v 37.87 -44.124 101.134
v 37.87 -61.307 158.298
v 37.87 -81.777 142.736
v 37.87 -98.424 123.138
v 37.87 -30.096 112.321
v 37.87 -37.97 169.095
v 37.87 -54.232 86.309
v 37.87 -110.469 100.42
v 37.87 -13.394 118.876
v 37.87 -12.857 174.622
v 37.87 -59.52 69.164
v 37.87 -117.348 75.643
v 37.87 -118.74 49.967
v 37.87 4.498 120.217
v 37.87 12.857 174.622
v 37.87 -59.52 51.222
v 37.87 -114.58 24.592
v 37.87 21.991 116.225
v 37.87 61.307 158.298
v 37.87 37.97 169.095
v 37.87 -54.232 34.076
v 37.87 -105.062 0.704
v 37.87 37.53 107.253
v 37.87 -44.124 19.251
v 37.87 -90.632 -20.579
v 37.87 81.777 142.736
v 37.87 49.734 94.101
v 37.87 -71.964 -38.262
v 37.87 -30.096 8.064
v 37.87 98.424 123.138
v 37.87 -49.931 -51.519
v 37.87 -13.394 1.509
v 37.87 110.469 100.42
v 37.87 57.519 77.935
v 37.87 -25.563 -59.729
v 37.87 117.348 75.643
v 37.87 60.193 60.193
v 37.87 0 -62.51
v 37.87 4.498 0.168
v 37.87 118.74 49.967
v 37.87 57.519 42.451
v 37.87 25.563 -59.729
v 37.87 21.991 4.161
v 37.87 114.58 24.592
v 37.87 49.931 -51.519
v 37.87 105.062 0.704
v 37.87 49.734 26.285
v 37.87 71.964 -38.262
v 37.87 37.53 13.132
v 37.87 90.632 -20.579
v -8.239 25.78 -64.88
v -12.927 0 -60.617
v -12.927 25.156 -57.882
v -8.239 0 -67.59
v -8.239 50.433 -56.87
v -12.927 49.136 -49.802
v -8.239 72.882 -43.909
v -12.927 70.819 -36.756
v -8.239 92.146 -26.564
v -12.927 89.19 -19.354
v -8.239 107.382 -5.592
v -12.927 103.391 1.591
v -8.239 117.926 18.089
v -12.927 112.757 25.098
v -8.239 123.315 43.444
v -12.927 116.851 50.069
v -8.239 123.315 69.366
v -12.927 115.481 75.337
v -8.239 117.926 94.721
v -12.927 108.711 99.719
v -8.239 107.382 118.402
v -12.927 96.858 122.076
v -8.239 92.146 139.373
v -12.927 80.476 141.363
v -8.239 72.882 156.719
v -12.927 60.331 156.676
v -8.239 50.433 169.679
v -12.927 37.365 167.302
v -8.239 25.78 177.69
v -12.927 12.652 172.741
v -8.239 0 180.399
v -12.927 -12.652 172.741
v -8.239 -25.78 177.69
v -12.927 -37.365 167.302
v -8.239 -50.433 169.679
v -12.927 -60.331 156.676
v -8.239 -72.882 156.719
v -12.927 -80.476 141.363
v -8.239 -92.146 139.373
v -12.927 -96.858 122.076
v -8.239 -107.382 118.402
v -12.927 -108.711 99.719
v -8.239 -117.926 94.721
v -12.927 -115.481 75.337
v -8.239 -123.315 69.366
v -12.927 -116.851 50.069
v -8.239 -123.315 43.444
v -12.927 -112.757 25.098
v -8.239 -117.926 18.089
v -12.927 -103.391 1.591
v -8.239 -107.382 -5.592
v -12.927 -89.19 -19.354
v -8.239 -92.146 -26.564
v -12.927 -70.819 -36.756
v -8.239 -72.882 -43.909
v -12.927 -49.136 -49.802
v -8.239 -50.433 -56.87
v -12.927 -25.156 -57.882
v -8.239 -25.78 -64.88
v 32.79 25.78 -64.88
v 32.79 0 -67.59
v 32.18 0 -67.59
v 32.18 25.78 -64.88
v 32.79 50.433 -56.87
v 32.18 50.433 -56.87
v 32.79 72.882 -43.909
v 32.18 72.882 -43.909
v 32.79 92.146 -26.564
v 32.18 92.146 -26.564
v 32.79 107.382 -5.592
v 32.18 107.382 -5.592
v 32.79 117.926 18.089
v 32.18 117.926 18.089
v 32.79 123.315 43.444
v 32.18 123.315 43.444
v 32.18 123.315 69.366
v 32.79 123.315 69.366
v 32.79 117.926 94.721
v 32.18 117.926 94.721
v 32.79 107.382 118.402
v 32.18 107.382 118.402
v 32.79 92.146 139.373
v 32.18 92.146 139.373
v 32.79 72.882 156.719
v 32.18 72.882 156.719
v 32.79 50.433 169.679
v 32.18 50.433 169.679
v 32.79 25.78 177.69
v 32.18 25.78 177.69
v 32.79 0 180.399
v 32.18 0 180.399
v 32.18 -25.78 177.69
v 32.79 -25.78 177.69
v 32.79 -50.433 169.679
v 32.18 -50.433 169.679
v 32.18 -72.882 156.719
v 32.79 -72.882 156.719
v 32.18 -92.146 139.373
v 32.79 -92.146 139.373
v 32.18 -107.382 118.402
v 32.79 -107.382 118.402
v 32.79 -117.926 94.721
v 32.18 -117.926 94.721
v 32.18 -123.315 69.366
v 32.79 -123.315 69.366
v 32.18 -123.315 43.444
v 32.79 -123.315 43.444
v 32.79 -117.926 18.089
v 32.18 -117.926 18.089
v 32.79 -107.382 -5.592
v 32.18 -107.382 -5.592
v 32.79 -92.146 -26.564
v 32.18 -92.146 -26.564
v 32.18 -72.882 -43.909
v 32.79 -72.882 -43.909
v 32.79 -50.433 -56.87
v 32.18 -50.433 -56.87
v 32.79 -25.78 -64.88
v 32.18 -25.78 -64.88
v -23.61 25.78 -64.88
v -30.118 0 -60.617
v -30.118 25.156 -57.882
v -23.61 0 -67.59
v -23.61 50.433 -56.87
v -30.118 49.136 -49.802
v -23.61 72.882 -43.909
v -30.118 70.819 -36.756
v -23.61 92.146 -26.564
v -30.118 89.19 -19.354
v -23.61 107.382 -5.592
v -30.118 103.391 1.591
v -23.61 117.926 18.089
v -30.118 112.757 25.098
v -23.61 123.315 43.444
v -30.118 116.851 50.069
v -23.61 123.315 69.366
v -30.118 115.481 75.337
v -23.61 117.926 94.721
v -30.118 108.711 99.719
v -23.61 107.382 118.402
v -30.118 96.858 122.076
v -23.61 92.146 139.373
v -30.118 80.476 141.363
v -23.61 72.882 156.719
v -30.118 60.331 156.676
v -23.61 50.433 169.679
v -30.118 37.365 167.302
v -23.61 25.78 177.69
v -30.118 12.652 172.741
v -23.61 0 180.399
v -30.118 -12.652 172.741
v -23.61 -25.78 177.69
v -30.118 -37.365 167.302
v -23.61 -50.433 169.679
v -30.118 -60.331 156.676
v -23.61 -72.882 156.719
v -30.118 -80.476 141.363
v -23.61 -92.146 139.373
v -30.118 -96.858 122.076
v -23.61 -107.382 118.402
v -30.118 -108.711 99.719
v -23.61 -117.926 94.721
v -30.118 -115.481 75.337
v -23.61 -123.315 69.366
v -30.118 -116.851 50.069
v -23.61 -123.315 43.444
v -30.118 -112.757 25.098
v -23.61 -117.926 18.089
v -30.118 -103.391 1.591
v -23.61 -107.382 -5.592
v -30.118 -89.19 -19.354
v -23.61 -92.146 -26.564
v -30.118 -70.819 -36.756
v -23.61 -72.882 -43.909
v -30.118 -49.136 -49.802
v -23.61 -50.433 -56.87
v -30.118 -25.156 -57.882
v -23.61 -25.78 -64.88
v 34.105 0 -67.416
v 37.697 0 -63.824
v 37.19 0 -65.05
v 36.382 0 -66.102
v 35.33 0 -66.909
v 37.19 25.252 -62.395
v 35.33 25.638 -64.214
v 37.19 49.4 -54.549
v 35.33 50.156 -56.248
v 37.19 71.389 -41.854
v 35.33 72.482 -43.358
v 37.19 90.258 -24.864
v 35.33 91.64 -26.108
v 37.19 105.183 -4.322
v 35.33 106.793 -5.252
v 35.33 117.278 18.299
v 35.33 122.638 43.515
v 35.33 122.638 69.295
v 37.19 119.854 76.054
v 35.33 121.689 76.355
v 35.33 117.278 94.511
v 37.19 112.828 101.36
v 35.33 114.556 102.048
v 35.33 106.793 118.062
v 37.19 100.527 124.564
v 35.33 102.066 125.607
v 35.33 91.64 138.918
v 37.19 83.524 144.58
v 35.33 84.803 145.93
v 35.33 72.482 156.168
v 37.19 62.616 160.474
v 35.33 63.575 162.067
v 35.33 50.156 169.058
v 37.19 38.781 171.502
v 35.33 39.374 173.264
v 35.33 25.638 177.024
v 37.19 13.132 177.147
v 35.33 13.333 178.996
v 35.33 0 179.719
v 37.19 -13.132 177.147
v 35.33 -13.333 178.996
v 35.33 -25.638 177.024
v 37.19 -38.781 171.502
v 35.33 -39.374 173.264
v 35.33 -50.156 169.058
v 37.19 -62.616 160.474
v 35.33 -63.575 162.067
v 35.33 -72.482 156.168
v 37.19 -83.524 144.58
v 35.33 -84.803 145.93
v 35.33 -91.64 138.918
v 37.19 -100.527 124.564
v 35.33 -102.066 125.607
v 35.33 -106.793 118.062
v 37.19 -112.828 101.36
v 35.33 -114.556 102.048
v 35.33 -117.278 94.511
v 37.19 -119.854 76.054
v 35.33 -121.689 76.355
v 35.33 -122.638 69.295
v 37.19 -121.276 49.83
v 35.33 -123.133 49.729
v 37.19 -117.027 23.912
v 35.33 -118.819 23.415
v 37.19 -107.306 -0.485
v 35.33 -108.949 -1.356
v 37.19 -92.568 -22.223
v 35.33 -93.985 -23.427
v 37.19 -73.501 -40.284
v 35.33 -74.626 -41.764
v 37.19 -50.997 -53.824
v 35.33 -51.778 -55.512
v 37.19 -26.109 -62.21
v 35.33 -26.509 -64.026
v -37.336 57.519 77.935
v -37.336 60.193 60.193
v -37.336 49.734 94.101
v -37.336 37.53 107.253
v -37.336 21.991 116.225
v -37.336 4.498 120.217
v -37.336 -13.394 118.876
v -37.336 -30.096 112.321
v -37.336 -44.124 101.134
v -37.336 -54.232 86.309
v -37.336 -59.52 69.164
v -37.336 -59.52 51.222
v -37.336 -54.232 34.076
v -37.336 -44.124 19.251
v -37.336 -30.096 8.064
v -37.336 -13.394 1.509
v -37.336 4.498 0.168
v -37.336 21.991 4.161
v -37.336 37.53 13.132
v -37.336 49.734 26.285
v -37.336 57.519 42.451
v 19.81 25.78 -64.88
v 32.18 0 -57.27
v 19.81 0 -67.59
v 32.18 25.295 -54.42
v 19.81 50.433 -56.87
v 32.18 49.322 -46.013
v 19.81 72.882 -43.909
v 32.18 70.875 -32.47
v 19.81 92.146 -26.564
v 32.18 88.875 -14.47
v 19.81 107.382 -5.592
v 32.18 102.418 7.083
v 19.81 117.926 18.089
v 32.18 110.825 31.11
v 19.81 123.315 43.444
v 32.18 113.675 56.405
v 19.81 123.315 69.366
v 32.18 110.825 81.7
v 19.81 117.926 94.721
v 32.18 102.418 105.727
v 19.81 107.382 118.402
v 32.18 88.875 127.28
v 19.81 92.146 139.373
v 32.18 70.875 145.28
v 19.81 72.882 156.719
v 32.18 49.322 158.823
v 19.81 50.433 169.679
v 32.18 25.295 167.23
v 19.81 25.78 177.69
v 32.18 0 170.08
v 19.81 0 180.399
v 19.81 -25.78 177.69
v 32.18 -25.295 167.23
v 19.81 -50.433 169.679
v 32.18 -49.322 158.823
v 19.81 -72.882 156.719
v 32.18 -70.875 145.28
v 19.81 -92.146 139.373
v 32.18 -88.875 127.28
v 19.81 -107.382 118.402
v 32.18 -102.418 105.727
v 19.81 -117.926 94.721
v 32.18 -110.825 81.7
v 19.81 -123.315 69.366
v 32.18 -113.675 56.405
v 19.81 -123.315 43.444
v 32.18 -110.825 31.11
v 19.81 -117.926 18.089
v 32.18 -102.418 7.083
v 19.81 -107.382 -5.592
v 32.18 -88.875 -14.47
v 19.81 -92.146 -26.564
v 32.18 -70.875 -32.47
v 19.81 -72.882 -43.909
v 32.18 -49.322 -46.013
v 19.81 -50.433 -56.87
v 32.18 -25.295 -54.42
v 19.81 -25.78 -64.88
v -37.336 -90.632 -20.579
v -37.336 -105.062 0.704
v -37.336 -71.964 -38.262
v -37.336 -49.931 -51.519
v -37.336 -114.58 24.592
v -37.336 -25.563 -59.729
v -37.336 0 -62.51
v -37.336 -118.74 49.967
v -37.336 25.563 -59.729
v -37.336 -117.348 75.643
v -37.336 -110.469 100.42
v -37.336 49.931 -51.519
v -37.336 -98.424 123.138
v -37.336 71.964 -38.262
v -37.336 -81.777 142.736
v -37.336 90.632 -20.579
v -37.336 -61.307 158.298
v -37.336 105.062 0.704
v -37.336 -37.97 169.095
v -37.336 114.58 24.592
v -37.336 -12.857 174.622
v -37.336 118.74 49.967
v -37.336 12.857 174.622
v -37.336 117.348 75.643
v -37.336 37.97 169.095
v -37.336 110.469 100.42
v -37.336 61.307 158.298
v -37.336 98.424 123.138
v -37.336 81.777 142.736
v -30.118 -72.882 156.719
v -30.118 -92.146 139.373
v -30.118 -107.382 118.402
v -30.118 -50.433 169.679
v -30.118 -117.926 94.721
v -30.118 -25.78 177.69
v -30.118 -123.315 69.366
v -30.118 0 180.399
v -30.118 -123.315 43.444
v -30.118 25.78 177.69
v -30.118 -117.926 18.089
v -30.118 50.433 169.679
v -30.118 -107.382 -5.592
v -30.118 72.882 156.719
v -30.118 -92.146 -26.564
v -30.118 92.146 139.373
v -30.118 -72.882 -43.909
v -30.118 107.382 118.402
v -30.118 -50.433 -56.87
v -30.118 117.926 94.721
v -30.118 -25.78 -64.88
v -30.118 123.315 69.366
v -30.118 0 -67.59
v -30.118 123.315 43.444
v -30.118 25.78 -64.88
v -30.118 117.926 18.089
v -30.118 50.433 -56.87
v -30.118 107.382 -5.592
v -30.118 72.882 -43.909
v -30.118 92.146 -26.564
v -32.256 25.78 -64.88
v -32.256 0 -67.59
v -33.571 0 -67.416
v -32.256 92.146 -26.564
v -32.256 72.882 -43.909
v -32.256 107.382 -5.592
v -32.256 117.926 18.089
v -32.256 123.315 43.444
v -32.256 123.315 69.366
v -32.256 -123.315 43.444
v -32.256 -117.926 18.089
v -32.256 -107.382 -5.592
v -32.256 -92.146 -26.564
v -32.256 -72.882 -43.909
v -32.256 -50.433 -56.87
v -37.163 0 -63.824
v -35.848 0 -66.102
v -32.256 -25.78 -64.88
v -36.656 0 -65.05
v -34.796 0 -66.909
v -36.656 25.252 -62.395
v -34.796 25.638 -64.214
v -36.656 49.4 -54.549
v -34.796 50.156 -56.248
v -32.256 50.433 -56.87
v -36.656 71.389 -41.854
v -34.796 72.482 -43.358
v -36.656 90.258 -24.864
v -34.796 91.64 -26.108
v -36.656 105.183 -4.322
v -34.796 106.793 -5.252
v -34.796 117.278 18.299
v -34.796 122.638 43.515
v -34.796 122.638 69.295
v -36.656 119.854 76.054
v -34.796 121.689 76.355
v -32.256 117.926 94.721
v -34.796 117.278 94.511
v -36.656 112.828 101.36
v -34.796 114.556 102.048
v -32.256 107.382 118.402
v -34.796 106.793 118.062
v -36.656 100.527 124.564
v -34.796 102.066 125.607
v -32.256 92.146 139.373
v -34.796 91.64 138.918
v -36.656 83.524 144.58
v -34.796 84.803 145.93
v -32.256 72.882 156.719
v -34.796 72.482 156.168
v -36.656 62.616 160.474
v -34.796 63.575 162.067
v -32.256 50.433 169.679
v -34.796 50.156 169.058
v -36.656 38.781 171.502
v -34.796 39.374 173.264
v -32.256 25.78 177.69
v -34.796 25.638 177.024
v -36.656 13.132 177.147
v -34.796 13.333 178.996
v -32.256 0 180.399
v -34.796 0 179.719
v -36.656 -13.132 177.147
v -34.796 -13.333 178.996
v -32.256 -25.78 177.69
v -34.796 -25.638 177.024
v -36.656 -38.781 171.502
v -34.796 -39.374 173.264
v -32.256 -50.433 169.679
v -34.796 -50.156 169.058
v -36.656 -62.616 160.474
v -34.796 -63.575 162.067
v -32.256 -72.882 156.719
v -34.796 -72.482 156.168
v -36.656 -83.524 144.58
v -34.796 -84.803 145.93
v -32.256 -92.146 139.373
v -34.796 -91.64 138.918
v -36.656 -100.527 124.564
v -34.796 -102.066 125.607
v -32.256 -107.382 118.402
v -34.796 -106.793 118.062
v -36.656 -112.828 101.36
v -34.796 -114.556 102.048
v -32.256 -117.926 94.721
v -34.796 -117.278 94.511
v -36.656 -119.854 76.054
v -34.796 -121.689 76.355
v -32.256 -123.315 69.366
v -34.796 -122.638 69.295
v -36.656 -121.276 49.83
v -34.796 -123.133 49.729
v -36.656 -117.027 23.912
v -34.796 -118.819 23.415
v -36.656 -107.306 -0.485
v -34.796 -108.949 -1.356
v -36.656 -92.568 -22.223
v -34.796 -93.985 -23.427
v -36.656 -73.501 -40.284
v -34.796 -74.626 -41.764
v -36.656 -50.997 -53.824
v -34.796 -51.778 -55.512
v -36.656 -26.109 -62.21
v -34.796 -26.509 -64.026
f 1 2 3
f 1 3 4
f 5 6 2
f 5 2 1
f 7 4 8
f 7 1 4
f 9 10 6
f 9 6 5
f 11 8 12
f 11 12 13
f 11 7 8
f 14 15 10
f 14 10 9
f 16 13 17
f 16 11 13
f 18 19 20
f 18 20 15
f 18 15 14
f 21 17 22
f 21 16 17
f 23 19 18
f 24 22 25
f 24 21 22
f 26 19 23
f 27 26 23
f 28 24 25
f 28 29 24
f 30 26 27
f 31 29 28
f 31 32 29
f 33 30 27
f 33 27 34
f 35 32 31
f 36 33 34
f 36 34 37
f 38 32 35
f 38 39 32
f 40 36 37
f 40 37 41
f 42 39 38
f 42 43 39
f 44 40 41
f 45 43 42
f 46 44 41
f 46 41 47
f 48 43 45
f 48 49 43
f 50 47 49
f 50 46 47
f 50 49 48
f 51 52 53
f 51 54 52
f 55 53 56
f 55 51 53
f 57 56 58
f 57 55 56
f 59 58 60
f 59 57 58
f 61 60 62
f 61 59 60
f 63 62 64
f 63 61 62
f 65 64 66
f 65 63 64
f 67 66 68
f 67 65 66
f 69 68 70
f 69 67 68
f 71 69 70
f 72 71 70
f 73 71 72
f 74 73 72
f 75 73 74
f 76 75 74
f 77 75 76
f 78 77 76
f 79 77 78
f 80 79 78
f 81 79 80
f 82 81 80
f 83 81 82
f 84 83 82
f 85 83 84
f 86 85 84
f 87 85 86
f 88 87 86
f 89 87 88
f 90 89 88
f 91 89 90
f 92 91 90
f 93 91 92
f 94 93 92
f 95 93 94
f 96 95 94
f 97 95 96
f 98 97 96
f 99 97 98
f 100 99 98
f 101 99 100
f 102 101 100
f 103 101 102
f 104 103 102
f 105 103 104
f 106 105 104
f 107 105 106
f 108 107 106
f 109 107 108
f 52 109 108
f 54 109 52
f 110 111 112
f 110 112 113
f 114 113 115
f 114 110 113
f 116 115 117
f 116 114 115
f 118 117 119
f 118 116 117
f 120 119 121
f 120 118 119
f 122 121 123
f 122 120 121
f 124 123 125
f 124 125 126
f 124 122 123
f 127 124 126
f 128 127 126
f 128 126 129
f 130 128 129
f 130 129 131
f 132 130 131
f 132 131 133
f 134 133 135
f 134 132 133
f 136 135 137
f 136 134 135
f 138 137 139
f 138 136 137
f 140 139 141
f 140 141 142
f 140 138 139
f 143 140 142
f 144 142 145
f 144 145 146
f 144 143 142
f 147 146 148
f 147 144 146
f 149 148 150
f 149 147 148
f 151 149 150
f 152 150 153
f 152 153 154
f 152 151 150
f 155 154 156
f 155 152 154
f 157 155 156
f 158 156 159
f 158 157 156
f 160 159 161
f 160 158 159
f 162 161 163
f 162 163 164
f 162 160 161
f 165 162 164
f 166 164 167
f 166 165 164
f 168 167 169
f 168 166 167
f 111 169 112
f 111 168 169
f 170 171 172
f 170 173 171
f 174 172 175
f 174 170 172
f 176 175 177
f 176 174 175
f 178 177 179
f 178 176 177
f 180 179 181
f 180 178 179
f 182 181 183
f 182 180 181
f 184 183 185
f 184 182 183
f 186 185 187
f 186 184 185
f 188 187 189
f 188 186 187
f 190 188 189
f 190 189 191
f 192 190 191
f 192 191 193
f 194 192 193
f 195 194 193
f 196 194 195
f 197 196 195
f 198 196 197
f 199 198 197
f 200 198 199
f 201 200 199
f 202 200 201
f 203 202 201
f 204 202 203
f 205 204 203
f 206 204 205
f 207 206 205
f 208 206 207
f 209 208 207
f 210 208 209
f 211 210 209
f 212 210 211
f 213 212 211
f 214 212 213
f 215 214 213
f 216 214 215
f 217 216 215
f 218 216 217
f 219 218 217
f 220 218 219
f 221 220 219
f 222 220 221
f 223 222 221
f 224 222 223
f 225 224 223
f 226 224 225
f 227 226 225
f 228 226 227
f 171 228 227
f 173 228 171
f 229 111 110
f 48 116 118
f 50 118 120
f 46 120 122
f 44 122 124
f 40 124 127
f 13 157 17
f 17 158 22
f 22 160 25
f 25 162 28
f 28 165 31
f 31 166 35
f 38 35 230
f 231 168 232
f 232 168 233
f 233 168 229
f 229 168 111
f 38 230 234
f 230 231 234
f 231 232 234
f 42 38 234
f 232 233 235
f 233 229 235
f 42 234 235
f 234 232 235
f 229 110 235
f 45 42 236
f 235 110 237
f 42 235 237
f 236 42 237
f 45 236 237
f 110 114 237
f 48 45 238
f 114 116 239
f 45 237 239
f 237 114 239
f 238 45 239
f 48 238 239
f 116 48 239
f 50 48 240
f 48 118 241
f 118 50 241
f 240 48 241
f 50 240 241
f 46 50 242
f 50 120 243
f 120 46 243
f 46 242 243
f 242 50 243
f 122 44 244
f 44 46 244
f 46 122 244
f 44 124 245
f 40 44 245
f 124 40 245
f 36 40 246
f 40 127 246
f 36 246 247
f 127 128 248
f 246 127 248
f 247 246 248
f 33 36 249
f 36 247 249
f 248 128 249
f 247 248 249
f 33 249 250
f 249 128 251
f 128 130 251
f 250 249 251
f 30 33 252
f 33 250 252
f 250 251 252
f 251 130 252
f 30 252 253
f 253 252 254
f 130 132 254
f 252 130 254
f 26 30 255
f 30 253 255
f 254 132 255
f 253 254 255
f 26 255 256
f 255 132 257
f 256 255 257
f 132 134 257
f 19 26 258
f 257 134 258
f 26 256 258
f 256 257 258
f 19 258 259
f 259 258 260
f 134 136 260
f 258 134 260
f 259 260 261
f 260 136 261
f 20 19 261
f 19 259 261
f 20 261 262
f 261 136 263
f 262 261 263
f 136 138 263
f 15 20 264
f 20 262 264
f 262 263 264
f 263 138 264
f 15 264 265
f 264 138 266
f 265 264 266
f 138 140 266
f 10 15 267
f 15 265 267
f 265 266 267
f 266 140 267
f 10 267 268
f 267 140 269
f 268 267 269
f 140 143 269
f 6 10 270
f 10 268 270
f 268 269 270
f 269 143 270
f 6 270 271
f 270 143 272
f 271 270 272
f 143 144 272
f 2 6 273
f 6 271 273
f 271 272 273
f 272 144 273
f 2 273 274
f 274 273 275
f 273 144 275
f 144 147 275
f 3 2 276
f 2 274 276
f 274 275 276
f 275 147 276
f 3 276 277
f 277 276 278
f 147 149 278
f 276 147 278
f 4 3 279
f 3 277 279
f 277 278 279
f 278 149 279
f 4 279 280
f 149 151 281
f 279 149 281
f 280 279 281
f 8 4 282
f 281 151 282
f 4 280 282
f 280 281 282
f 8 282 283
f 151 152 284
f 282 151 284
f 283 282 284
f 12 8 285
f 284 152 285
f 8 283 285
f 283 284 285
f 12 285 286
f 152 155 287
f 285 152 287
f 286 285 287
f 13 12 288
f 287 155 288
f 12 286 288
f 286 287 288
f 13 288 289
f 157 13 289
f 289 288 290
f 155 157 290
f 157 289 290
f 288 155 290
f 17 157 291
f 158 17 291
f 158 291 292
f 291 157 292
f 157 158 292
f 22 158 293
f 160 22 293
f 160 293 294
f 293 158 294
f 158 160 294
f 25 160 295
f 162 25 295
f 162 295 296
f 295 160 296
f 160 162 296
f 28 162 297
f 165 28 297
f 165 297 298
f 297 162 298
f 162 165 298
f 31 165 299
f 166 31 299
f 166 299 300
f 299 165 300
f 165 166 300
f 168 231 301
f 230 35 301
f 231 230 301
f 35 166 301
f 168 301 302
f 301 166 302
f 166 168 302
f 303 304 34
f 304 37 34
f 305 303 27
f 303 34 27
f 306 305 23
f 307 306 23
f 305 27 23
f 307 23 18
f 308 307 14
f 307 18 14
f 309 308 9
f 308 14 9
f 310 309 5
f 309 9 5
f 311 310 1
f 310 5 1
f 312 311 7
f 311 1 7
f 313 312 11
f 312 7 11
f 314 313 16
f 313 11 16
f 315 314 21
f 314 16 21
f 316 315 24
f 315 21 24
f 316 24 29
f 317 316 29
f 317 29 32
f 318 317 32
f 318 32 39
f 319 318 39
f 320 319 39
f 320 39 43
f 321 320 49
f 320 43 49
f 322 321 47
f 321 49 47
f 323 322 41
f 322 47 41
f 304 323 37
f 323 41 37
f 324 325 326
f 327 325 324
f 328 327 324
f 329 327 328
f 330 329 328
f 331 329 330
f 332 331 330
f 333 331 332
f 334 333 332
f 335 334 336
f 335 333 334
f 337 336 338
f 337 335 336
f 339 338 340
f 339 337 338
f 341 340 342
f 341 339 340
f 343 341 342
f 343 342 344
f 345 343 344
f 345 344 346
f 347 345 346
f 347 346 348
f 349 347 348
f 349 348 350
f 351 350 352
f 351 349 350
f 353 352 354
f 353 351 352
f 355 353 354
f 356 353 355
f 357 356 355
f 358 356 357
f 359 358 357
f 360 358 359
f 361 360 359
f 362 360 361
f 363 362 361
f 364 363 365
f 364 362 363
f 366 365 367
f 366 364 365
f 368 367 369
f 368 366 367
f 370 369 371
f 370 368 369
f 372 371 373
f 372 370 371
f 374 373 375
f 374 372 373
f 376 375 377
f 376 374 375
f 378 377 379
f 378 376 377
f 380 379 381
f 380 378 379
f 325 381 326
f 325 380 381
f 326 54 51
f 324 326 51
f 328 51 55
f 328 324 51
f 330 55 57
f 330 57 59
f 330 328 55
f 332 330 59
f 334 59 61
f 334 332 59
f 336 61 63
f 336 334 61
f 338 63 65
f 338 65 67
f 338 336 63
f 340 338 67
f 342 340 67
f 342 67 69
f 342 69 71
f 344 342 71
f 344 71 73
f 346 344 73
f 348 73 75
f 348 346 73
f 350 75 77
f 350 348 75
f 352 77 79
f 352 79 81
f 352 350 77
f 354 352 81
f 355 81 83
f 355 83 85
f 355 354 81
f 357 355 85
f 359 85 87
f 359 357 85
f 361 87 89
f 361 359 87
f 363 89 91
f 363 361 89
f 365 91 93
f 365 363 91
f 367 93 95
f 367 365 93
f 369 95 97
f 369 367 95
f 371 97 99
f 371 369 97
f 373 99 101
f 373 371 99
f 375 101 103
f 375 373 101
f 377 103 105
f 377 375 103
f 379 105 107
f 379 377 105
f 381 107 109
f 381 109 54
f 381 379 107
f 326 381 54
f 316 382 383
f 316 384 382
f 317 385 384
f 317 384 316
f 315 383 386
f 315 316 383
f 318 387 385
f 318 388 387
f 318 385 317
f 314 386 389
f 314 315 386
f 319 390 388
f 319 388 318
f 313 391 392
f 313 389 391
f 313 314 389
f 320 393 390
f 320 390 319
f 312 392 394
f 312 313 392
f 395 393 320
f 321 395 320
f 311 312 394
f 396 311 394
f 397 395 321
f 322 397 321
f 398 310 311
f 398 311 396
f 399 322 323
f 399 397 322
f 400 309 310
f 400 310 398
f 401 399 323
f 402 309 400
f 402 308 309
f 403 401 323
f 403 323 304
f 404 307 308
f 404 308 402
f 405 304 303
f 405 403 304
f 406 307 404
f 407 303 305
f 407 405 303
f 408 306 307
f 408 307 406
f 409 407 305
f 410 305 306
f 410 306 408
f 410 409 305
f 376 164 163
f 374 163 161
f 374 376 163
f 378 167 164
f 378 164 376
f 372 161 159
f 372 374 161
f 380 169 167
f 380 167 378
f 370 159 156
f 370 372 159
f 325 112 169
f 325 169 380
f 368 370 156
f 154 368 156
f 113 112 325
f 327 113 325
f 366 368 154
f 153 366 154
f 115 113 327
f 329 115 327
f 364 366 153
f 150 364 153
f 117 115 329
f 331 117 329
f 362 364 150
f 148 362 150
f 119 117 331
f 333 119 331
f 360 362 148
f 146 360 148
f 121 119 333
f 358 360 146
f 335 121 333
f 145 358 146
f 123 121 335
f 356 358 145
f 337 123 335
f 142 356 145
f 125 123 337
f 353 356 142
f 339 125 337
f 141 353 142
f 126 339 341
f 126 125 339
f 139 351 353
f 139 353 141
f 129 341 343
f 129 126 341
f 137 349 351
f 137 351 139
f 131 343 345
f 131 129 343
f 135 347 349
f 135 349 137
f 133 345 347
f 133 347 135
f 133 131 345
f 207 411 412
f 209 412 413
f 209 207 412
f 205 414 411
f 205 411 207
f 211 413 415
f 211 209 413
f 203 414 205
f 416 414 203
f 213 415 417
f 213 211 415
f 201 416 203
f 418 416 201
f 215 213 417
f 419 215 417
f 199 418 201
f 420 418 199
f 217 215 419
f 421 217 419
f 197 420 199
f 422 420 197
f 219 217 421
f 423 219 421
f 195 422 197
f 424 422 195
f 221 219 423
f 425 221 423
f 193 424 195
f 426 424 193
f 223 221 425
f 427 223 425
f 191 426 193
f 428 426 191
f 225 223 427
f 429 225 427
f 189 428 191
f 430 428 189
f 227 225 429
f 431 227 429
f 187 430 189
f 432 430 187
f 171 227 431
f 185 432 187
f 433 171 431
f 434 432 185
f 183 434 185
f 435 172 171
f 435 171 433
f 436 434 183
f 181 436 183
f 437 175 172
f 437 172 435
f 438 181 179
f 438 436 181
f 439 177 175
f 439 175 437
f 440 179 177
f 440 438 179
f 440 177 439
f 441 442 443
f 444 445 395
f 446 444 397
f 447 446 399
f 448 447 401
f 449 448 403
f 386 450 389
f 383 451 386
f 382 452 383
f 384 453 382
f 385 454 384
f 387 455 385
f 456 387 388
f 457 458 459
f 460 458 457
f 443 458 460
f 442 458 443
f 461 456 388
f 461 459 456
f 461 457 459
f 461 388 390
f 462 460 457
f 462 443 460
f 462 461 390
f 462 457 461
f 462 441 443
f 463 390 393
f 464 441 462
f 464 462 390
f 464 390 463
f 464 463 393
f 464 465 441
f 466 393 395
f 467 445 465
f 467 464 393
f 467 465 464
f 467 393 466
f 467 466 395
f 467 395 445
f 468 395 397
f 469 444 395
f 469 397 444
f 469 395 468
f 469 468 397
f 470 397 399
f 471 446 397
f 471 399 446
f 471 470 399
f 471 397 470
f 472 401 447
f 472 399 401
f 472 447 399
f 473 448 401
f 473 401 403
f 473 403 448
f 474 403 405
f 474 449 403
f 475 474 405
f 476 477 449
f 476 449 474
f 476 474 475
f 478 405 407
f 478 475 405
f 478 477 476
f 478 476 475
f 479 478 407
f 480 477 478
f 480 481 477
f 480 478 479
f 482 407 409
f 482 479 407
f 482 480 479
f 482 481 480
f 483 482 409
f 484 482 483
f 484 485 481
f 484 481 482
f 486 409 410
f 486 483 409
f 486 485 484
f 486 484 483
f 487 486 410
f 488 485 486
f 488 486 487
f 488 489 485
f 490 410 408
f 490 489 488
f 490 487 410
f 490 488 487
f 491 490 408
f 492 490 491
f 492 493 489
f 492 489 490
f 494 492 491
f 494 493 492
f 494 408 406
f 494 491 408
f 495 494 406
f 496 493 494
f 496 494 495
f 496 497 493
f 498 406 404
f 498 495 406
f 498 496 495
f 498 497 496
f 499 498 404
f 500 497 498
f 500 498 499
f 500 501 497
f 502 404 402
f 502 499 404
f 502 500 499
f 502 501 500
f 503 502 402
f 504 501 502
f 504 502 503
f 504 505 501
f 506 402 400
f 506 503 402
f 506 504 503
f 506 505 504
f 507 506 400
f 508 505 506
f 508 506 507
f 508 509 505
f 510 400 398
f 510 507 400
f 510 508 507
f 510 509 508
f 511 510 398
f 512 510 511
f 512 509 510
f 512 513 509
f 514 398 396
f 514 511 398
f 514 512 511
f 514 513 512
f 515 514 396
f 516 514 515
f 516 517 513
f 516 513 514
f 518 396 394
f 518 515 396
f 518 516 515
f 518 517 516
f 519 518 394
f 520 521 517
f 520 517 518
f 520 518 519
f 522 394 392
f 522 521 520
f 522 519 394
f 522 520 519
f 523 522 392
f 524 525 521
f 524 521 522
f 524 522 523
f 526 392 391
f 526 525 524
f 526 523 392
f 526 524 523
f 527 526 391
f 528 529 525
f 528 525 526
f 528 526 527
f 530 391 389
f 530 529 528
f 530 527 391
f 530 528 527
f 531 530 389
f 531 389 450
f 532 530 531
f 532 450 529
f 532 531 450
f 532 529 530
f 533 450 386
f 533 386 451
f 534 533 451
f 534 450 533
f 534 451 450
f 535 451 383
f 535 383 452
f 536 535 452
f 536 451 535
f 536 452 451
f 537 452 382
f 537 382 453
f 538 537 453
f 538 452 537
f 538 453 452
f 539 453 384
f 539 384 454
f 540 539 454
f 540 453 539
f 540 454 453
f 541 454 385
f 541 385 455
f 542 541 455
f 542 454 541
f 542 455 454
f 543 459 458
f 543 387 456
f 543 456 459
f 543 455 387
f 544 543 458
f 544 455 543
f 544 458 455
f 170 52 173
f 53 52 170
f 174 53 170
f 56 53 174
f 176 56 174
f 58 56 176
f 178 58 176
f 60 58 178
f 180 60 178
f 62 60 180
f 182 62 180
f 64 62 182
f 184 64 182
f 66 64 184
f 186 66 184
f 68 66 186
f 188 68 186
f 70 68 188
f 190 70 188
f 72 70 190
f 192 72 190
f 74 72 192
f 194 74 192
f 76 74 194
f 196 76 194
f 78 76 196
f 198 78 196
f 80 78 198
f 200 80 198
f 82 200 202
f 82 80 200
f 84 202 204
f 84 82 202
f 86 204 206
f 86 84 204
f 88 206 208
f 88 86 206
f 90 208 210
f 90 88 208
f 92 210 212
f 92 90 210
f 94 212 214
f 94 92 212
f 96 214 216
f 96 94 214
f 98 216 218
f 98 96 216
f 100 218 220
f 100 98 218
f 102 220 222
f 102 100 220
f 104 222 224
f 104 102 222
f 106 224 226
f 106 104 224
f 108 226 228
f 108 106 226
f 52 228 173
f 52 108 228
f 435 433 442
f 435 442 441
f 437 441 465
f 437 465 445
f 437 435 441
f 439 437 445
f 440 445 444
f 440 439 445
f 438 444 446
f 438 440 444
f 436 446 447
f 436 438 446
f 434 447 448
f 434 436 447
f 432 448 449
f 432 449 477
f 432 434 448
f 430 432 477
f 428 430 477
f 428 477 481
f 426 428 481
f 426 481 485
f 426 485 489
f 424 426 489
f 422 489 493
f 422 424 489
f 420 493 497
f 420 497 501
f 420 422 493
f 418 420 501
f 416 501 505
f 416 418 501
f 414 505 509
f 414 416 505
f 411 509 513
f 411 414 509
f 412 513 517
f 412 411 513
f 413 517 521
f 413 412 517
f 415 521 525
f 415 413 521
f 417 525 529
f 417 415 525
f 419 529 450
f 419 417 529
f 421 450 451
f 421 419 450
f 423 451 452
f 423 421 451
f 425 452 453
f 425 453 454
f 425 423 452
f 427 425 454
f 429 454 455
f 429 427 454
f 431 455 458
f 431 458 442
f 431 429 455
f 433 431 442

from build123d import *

# Parameters (mm, degrees)
F2_R     = 60.1927898824
F3_DEPTH = 1270
F4_R     = 5.08


with BuildPart() as f1:
    # F0 (on Front) → F1 (revolve)
    with BuildSketch(Plane.XZ):
        Polygon((37.8701165318, 56.4049184322), (-37.3361222446, 56.4049184322), (-37.3361222446, -67.5895376156), (-30.1177501678, -67.5895376156), (-30.1177501678, -60.6174655259), (-23.6104177256, -67.5895376156), (-12.9269050552, -60.6174655259), (-8.2385898663, -67.5895376156), (19.8104574267, -67.5895376156), (32.1801453829, -57.270154357), (32.1801453829, -67.5895376156), (37.8701165318, -67.5895376156), align=None)
    revolve(axis=Axis((0.2669971436, 0, 56.4049184322), (1, 0, 0)))

    # F2 (on Right) → F3 (cut, symmetric)
    with BuildSketch(Plane.YZ):
        with Locations((0, 60.1927898824)):
            Circle(F2_R)
    extrude(amount=F3_DEPTH, both=True, mode=Mode.SUBTRACT)

    # F4
    f4_edges = [f1.edges().sort_by_distance(p)[0] for p in [
        (37.870117, 0, 180.399374),
        (-37.336122, 0, 180.399374),
    ]]
    fillet(f4_edges, radius=F4_R)


solid = f1.part
